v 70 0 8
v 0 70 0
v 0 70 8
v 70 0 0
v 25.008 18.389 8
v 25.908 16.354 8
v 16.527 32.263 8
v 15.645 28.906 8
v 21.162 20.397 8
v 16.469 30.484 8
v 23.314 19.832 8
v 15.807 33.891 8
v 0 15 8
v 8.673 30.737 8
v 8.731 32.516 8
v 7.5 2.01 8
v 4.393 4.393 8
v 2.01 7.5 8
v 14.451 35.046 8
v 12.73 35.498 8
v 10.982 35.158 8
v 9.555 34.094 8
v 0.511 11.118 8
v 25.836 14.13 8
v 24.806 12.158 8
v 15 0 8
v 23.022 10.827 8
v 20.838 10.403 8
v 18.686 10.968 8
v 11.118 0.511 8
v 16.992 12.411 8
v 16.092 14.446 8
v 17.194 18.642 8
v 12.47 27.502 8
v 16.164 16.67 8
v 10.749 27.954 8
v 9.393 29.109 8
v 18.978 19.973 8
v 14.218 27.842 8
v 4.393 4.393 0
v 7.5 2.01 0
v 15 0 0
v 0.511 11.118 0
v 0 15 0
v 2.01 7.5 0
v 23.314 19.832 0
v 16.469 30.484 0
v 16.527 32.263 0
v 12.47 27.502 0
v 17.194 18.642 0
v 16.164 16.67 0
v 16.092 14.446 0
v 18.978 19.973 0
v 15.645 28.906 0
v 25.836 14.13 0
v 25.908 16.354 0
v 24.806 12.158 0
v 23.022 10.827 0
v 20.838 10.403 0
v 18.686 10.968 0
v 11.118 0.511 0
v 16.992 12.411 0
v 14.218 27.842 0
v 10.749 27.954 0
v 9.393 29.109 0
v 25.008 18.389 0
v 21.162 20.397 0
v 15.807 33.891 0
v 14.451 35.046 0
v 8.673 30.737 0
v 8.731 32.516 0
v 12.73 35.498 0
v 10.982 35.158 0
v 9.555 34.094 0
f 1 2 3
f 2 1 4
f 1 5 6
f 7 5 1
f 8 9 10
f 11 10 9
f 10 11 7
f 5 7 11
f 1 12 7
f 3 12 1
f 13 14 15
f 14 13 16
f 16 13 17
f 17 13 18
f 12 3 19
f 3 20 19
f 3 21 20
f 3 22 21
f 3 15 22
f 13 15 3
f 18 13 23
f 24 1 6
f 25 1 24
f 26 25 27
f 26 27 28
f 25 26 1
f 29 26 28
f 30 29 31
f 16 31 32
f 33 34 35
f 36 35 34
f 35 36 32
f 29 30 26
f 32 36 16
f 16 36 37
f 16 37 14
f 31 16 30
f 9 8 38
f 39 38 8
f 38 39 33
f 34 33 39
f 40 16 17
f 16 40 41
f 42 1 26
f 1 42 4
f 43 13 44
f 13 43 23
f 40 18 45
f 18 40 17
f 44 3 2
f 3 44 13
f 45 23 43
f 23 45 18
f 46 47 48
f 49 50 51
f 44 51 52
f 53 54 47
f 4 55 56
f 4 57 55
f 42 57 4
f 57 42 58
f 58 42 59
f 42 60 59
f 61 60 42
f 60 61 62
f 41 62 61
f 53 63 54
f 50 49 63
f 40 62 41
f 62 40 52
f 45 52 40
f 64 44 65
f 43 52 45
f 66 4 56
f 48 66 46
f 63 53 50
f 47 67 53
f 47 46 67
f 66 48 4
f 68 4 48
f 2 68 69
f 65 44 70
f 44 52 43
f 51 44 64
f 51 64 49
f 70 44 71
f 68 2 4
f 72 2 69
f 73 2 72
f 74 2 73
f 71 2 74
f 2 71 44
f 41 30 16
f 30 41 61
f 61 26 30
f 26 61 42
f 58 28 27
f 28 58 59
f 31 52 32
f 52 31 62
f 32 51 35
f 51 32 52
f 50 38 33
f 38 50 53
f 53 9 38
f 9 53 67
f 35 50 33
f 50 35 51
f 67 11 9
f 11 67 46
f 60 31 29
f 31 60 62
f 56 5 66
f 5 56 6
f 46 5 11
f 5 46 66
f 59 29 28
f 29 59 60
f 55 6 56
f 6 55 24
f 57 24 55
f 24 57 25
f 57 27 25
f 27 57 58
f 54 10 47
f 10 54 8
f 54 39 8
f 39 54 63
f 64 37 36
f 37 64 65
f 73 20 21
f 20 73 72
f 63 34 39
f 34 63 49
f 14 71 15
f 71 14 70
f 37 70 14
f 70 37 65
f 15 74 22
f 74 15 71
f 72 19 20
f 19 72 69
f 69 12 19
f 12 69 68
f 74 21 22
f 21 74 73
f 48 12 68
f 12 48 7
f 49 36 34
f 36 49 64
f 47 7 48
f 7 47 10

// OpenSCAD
$fn = 32;

// ----------------------------------------------------------------------
// Bracket plate: corner pad 70 x 70, fillet R15
// ----------------------------------------------------------------------

// --- parameters (mm) ---
hole_r = 4;               // bolt hole radius
plate_t = 8;              // plate thickness, Z (extrusion height)
leg_a = 70;               // base leg
leg_b = 70;               // height leg
fillet_r = 15;            // right-angle fillet radius
fit_tol = 0.1;            // declared fit tolerance (prompt contract)
free_tol = 0.5;           // declared free tolerance (prompt contract)

hole_d1 = 2 * hole_r + 2;
hole_d2 = 2 * hole_r;

profile = [[15, 0], [70, 0], [0, 70], [0, 15], [0.511, 11.118], [2.01, 7.5], [4.393, 4.393], [7.5, 2.01], [11.118, 0.511]];  // primary outline, 9 points, counter clockwise
void_1 = [[25.908, 16.354], [25.008, 18.389], [23.314, 19.832], [21.162, 20.397], [18.978, 19.973], [17.194, 18.642], [16.164, 16.67], [16.092, 14.446], [16.992, 12.411], [18.686, 10.968], [20.838, 10.403], [23.022, 10.827], [24.806, 12.158], [25.836, 14.13]];  // mount hole 1, 14 points
void_2 = [[16.527, 32.263], [15.807, 33.891], [14.451, 35.046], [12.73, 35.498], [10.982, 35.158], [9.555, 34.094], [8.731, 32.516], [8.673, 30.737], [9.393, 29.109], [10.749, 27.954], [12.47, 27.502], [14.218, 27.842], [15.645, 28.906], [16.469, 30.484]];  // mount hole 2, 14 points

// --- the one profile operation ---
difference() {
  linear_extrude(height = plate_t) polygon(points = profile);
  translate([0, 0, -1])
    linear_extrude(height = plate_t + 2) polygon(points = void_1);
  translate([0, 0, -1])
    linear_extrude(height = plate_t + 2) polygon(points = void_2);
}
